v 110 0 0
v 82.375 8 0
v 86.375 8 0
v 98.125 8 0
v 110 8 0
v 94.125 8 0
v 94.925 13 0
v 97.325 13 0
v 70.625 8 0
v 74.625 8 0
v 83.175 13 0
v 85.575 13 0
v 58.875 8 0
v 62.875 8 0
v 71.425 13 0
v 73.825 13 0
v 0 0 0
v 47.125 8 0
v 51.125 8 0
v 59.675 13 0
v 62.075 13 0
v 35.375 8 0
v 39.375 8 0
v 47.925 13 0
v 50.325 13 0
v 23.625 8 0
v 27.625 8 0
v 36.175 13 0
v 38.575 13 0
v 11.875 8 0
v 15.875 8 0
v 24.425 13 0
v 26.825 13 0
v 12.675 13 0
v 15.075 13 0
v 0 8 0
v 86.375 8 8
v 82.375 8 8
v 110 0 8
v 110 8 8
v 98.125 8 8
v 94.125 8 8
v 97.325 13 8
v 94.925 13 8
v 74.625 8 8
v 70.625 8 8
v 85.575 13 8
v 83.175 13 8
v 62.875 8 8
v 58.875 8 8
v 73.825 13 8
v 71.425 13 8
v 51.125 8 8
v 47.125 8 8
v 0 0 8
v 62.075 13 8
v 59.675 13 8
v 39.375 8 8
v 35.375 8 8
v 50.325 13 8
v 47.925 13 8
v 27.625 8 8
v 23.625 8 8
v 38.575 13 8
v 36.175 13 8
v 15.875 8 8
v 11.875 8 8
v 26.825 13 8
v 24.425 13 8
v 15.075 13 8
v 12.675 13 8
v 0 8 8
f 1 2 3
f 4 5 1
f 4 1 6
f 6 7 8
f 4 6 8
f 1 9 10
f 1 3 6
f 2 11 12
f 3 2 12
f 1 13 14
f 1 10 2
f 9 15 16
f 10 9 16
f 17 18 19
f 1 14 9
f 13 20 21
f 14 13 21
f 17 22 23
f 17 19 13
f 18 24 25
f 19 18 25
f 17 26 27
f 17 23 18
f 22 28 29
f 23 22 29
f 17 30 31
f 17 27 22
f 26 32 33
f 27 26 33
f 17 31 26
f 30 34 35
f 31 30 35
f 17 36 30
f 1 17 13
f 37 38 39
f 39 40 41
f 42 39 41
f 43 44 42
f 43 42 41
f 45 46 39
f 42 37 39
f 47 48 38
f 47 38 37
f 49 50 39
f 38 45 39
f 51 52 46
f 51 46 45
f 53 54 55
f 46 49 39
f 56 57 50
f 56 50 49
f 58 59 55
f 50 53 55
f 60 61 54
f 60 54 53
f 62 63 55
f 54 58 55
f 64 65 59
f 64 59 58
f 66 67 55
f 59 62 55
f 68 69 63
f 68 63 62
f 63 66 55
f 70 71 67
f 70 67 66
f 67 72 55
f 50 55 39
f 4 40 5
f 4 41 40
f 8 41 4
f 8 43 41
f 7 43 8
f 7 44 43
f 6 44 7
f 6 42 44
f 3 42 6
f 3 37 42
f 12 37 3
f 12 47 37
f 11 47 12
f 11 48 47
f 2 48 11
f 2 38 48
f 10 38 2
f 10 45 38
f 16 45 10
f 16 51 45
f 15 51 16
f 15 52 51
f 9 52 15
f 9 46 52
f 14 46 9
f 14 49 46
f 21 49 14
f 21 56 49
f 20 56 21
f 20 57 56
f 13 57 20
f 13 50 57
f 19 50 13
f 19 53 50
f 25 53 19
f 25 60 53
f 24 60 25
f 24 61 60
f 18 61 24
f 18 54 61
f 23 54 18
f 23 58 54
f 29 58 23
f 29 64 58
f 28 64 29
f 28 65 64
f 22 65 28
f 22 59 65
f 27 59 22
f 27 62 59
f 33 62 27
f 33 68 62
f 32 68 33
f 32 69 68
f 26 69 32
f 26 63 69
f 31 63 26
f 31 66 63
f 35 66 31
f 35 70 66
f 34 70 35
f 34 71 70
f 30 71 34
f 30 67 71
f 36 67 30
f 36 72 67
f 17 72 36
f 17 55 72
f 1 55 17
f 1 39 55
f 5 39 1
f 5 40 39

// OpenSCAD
$fn = 32;

// ----------------------------------------------------------------------
// Gear rack: 8 teeth on a 110 mm bar, pitch 11.75 mm
// ----------------------------------------------------------------------

// --- parameters (mm) ---
profile_height = 8;       // extrusion height
profile_points = 36;      // points of the closed outline

profile = [[0, 0], [110, 0], [110, 8], [98.125, 8], [97.325, 13], [94.925, 13], [94.125, 8], [86.375, 8], [85.575, 13], [83.175, 13], [82.375, 8], [74.625, 8], [73.825, 13], [71.425, 13], [70.625, 8], [62.875, 8], [62.075, 13], [59.675, 13], [58.875, 8], [51.125, 8], [50.325, 13], [47.925, 13], [47.125, 8], [39.375, 8], [38.575, 13], [36.175, 13], [35.375, 8], [27.625, 8], [26.825, 13], [24.425, 13], [23.625, 8], [15.875, 8], [15.075, 13], [12.675, 13], [11.875, 8], [0, 8]];  // single closed polygon, 36 points, counter clockwise

// --- the one profile operation ---
linear_extrude(height = profile_height) polygon(points = profile);
